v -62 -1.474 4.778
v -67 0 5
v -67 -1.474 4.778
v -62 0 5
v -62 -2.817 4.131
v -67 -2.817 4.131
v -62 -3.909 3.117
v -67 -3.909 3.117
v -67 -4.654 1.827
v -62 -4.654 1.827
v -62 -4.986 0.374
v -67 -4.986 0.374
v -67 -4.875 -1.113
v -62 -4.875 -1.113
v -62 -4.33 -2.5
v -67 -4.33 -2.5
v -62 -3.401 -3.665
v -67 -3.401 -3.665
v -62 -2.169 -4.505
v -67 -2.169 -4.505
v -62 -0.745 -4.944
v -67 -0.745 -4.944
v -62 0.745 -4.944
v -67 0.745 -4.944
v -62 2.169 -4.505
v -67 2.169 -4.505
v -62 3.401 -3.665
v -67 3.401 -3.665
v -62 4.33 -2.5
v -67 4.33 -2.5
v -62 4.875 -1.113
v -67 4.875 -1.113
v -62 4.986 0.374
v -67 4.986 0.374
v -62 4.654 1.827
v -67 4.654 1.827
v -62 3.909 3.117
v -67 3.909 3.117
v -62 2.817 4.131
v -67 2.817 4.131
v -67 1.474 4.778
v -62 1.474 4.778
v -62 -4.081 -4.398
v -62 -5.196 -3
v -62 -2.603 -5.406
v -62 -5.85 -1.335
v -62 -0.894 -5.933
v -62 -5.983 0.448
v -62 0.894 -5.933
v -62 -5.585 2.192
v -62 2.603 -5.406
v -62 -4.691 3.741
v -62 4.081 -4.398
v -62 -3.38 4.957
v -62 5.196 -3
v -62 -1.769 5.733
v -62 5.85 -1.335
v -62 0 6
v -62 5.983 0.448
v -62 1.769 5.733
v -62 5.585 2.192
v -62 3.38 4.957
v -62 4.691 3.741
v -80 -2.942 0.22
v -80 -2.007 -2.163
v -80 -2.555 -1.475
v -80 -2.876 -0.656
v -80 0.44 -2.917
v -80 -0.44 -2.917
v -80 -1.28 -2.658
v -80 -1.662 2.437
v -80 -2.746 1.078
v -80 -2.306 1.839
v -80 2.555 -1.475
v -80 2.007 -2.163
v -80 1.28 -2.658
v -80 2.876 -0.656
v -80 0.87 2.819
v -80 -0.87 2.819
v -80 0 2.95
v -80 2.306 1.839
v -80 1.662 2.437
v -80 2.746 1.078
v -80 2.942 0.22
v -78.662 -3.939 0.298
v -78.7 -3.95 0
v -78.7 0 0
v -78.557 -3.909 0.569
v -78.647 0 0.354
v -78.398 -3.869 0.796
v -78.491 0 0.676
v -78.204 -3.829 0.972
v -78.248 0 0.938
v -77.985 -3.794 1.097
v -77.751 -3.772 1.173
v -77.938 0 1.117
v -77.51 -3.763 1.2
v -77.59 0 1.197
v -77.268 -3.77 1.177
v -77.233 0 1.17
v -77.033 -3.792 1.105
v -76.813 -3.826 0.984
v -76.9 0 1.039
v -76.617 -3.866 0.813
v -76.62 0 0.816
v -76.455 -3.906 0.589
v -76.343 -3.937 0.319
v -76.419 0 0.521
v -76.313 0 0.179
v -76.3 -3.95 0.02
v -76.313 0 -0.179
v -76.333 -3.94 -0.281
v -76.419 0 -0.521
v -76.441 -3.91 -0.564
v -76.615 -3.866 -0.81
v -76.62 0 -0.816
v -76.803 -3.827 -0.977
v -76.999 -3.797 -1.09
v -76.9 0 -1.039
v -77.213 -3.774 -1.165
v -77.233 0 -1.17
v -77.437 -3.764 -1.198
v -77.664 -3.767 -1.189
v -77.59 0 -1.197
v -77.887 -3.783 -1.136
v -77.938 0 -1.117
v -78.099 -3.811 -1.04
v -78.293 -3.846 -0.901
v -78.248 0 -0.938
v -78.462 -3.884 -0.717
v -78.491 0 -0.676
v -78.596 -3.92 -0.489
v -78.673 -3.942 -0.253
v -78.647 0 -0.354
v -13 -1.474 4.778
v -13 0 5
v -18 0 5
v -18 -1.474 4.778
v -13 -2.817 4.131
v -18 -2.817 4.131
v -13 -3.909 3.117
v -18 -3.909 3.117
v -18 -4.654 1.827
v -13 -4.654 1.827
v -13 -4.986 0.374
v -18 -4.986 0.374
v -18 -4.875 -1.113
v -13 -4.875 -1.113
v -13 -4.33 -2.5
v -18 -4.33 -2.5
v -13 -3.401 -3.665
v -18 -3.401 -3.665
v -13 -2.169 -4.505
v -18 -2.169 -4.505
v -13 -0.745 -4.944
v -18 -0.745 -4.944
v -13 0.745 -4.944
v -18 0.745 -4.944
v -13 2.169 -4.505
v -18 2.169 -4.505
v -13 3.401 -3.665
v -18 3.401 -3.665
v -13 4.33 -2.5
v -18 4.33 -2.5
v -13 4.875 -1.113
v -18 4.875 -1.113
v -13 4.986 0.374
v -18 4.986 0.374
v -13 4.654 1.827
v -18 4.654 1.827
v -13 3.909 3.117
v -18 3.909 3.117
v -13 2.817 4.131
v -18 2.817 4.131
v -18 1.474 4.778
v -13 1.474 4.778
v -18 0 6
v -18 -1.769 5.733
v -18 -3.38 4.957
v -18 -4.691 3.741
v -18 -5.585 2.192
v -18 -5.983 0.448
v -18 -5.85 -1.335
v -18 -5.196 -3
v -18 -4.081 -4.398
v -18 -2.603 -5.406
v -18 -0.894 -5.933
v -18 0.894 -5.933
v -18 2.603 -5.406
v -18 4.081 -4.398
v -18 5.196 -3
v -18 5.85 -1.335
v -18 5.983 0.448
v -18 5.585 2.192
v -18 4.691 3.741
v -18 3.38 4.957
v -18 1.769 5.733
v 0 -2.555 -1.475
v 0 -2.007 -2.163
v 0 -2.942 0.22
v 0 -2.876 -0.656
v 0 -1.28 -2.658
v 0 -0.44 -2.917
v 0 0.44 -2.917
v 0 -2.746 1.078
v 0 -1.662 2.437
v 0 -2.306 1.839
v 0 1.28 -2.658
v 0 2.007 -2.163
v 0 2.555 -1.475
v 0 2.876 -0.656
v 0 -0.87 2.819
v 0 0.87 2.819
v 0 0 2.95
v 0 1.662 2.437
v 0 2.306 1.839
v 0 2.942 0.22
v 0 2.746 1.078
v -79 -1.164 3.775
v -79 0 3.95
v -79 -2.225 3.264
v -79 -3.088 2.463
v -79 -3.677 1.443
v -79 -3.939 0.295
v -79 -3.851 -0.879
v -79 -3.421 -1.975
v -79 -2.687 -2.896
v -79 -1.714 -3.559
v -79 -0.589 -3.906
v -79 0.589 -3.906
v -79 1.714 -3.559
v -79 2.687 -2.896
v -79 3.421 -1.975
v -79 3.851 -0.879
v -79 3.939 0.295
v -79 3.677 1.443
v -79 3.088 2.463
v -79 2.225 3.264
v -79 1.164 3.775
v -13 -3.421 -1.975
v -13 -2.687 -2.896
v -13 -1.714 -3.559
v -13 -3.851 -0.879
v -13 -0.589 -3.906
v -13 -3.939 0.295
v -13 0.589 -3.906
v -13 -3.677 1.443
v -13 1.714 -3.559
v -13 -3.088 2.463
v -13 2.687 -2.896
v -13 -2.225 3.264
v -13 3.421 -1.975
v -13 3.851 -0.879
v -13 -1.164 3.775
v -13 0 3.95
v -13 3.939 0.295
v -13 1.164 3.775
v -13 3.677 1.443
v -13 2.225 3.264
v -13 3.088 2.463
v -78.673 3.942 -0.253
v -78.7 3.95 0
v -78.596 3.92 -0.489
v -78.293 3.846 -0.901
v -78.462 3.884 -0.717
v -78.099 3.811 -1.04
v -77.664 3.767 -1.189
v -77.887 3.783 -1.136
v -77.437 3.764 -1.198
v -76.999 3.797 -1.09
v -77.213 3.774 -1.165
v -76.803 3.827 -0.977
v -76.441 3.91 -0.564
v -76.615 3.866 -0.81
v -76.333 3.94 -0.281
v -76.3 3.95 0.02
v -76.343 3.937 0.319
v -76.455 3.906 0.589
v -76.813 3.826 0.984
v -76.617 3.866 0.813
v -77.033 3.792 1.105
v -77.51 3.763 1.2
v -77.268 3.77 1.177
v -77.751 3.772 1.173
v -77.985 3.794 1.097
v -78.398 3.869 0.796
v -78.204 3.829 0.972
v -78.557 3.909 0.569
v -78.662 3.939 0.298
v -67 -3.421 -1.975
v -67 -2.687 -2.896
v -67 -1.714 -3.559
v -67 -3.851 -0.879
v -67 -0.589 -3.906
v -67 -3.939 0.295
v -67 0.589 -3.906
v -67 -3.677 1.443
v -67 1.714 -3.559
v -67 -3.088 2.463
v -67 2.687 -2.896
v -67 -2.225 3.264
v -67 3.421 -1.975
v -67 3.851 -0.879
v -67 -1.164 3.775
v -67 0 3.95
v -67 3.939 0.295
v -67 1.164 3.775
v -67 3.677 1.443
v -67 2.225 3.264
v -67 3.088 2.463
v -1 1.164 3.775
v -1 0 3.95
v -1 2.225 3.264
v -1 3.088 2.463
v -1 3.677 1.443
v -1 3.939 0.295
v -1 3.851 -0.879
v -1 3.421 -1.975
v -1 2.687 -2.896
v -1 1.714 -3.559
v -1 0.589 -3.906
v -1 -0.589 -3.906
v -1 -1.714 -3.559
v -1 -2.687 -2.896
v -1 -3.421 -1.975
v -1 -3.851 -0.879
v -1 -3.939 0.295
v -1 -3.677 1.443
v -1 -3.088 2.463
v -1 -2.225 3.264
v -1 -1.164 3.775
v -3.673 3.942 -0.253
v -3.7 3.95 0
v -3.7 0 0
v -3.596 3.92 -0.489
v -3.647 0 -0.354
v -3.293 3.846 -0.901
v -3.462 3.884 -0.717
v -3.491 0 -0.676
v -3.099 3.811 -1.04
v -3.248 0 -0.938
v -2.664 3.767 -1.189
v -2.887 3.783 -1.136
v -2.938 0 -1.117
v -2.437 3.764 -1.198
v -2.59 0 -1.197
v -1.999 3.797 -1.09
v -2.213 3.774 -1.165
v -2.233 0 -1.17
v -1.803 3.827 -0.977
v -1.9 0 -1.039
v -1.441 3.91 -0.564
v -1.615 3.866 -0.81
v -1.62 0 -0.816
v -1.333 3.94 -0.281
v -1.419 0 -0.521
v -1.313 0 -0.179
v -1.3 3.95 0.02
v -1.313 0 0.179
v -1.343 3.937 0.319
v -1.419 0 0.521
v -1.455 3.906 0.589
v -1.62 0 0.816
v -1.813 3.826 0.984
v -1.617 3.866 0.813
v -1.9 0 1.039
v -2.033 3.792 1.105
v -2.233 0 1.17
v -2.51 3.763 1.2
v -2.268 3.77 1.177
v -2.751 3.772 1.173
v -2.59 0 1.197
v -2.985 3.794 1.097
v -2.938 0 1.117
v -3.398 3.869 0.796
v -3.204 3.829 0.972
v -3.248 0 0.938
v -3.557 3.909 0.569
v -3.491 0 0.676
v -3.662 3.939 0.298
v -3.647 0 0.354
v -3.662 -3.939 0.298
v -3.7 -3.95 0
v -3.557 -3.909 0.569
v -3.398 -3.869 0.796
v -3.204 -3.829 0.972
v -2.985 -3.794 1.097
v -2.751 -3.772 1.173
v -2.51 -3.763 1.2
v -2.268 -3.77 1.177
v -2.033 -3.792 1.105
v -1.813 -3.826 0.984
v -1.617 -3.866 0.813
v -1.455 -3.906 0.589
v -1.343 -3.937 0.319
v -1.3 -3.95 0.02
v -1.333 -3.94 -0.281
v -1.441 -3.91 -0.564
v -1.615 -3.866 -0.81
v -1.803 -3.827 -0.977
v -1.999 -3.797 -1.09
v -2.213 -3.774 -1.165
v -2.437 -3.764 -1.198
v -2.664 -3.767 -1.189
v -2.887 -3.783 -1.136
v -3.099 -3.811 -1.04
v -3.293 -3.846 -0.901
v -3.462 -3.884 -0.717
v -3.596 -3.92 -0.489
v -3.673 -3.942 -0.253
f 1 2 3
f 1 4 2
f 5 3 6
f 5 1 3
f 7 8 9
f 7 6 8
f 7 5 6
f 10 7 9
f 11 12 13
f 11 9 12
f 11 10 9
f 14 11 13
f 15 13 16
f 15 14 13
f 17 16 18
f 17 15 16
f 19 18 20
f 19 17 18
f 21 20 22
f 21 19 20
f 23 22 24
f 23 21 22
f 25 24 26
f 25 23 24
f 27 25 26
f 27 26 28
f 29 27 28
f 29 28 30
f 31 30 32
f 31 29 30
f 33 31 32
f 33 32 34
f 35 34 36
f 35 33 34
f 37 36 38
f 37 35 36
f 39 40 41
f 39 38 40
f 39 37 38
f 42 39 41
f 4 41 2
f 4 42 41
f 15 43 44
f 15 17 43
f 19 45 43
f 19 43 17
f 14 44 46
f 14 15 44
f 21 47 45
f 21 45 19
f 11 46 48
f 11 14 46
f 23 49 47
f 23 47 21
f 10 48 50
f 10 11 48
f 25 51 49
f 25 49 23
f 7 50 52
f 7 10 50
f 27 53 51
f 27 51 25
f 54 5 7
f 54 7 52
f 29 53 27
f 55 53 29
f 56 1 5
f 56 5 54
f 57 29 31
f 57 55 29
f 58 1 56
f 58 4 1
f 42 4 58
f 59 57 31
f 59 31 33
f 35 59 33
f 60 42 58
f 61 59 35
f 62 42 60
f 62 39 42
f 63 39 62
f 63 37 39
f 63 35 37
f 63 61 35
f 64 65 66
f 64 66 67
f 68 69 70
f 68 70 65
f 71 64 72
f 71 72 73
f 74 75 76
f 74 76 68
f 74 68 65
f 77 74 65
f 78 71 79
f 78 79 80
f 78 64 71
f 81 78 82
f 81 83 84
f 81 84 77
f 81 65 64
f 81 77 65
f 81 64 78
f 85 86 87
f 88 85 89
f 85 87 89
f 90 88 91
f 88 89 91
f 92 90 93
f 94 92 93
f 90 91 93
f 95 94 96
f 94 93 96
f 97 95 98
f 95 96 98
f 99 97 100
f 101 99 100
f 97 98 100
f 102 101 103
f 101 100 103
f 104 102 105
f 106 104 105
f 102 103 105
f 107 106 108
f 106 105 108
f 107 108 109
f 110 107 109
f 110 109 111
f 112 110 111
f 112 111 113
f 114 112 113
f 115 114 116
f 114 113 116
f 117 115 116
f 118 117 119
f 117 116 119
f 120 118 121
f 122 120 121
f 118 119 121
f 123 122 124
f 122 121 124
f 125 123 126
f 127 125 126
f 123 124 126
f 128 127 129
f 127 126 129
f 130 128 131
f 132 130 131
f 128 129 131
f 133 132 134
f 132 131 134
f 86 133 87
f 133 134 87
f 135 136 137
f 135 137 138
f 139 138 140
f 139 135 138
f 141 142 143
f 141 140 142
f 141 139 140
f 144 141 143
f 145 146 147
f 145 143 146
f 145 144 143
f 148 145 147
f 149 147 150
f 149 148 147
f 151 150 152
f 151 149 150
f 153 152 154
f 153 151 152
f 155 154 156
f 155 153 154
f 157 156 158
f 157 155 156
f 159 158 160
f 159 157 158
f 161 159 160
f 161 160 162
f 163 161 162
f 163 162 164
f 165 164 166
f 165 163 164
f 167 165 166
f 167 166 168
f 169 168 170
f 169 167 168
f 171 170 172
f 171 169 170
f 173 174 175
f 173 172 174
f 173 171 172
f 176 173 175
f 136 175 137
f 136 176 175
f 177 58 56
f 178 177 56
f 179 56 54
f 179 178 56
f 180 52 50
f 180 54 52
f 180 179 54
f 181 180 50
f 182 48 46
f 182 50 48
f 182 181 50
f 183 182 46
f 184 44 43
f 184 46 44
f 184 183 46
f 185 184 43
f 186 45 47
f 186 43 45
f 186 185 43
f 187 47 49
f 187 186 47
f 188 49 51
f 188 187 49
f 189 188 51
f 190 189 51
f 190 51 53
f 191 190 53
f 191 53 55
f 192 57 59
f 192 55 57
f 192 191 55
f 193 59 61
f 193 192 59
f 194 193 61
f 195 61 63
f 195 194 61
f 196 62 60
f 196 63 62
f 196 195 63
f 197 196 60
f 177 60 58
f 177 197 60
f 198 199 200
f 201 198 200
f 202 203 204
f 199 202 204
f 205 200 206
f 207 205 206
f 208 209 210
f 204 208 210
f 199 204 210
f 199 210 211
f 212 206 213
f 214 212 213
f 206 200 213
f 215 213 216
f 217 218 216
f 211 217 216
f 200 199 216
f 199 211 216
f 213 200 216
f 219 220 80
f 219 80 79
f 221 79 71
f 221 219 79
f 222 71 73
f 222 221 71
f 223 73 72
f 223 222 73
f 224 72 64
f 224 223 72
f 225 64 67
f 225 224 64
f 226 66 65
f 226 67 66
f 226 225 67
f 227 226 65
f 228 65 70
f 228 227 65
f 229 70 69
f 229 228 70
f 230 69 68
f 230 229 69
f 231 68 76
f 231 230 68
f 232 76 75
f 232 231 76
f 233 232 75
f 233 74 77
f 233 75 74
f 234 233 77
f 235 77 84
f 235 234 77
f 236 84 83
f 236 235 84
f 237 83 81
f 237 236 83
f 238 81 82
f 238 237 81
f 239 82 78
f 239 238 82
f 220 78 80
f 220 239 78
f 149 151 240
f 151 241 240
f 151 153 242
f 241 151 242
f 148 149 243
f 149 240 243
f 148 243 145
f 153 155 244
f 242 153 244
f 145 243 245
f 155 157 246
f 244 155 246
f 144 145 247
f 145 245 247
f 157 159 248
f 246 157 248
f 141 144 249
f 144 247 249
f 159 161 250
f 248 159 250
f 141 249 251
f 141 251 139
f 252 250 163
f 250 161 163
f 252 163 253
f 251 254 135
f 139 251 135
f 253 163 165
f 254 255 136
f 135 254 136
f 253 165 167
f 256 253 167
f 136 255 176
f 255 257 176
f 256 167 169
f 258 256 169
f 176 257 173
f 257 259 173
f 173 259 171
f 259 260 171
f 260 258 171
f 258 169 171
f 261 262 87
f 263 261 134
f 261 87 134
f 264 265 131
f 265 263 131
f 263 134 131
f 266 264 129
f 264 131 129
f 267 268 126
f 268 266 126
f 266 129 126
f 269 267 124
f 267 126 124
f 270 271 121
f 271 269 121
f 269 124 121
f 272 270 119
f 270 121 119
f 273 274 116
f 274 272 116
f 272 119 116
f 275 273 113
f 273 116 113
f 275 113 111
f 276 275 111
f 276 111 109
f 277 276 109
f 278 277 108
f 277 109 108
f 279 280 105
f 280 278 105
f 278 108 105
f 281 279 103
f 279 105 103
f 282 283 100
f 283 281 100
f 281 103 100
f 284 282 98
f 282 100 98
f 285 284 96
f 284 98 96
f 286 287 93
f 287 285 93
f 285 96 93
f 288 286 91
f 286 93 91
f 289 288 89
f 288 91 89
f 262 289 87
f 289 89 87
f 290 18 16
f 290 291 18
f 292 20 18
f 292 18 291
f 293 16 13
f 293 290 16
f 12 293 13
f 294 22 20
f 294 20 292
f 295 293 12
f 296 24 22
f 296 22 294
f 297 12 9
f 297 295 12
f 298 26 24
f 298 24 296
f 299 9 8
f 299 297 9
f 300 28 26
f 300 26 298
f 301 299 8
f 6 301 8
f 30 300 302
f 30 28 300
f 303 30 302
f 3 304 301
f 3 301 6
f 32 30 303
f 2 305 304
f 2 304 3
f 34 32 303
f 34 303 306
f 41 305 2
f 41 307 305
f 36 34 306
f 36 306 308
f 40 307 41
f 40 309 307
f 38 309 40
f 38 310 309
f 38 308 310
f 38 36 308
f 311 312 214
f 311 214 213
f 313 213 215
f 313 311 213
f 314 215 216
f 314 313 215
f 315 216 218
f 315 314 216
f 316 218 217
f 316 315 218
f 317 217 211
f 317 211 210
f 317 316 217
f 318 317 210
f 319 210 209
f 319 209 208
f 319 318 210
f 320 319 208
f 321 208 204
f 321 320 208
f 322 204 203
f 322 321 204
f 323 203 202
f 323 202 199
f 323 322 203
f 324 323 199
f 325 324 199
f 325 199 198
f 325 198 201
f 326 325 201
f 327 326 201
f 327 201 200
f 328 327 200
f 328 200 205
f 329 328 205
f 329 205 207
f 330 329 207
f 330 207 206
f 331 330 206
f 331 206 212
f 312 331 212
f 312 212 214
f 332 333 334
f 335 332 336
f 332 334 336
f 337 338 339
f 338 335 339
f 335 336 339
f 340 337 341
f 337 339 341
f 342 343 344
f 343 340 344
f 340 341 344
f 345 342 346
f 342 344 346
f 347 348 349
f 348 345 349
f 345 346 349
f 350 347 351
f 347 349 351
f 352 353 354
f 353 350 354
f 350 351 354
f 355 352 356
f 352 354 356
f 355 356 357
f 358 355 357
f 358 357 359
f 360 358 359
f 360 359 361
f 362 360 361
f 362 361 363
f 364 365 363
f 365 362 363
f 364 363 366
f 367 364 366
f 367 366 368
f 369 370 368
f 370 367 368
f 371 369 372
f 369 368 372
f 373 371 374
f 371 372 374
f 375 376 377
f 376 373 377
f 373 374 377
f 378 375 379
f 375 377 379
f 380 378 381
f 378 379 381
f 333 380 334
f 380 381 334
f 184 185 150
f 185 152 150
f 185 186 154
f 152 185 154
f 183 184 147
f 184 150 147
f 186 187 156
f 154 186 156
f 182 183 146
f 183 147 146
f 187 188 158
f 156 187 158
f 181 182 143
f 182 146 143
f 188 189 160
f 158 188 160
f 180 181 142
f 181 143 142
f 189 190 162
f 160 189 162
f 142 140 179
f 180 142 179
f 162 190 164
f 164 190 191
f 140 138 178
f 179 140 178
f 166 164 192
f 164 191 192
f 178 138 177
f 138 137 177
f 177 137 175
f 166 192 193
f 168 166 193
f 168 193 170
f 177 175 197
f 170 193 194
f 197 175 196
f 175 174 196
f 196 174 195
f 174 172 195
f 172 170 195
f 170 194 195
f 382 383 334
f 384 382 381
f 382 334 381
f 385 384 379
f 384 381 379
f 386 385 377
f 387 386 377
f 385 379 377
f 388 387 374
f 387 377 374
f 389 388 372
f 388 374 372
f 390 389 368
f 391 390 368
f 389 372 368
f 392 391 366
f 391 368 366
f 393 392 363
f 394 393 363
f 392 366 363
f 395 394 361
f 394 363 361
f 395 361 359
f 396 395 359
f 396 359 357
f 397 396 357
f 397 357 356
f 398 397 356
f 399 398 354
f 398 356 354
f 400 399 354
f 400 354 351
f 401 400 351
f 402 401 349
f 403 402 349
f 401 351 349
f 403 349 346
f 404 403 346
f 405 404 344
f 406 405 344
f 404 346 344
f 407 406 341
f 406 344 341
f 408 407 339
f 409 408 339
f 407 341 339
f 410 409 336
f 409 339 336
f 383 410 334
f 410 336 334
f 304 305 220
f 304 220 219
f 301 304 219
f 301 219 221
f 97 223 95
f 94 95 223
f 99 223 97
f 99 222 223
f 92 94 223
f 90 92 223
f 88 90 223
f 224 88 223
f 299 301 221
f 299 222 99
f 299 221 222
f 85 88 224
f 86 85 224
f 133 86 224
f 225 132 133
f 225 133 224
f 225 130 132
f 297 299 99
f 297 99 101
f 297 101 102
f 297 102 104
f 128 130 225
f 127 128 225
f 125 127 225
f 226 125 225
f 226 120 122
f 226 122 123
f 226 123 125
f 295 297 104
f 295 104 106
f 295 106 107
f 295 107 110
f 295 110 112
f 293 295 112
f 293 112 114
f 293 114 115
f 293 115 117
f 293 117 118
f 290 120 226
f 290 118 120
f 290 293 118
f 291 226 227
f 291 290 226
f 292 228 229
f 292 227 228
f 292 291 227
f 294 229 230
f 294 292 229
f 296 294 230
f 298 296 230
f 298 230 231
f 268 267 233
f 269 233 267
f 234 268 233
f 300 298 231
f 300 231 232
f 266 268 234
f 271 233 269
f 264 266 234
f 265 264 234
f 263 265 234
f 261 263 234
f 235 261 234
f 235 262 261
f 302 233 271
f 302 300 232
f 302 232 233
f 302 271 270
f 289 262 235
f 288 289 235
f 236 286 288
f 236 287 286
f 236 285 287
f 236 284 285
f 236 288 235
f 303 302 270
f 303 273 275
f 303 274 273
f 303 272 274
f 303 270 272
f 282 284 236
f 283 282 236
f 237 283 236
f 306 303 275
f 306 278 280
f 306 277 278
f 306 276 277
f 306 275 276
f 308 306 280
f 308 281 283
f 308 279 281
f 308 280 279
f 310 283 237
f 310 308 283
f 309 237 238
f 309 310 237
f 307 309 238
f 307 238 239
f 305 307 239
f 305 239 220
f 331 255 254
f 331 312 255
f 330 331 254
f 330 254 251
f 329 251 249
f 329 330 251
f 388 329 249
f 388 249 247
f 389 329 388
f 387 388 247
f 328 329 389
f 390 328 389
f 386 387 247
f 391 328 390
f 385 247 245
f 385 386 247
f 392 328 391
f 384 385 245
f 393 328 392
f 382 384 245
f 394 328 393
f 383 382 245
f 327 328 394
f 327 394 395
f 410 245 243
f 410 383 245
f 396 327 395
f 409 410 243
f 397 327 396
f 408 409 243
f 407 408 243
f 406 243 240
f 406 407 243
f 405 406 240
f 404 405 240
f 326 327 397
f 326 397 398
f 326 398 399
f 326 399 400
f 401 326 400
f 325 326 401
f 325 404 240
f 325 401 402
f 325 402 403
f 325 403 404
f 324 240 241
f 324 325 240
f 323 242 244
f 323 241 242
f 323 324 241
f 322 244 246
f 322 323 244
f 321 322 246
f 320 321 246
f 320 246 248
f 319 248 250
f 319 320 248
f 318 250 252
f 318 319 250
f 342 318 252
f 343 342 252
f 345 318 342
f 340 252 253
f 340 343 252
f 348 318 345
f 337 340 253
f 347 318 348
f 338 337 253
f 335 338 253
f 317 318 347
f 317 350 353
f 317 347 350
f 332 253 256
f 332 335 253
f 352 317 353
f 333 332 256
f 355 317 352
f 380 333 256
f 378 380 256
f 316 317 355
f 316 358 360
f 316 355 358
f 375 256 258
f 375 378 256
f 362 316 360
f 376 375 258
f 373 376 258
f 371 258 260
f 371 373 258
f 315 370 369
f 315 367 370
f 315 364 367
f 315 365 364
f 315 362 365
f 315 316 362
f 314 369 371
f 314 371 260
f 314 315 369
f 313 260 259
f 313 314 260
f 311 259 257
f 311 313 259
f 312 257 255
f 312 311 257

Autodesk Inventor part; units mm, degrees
ref_plane "YZ Plane" through (0, 0, 0) normal (1, 0, 0) x (0, 1, 0)
ref_plane "XZ Plane" through (0, 0, 0) normal (0, 1, 0) x (-1, 0, 0)
ref_plane "XY Plane" through (0, 0, 0) normal (0, 0, 1) x (1, 0, 0)
sketch "Sketch1" plane through (0, 0, 0) normal (0, 1, 0) x (-1, 0, 0)
  line L0 (0, 0) -> (80, 0)
  line L1 (80, 0) -> (80, 3.95)
  line L2 (80, 3.95) -> (67, 3.95)
  line L3 (67, 3.95) -> (67, 5)
  line L4 (67, 5) -> (62, 5)
  line L5 (62, 5) -> (62, 6)
  line L6 (62, 6) -> (18, 6)
  line L7 (18, 6) -> (18, 5)
  line L8 (18, 5) -> (13, 5)
  line L9 (13, 5) -> (13, 3.95)
  line L10 (13, 3.95) -> (0, 3.95)
  line L11 (0, 3.95) -> (0, 0)
  point P0 (40, 6)
  dimension "d0" = 80
  dimension "d1" = 3.95
  dimension "d2" = 18
  dimension "d3" = 5
  dimension "d4" = 5
  dimension "d5" = 6
  dimension "d6" = 22
  dimension "d7" = 5
revolve "Revolution1" add sketch "Sketch1" angle 360 about axis through (0, 0, 0) along (-1, 0, 0)
chamfer "Chamfer1" distance 1 angle 45 2 edges at (-80, 0, -3.95) (0, 0, -3.95)
sketch "Sketch2" plane through (0, 0, 0) normal (0, 1, 0) x (-1, 0, 0)
  circle A0 centre (77.5, 0) radius 1.2
  line L0 (80, 2.95) -> (80, -2.95) projected
  circle A1 centre (2.5, 0) radius 1.2
  line L1 (0, -2.95) -> (0, 2.95) projected
  point P0 (0, 0)
  dimension "d12" = 2.4
  dimension "d13" = 2.5
  dimension "d14" = 2.4
  dimension "d15" = 2.5
extrude "Extrusion1" cut sketch "Sketch2" along normal mid plane 10
properties part number "Axel" material "Iron, Cast"
